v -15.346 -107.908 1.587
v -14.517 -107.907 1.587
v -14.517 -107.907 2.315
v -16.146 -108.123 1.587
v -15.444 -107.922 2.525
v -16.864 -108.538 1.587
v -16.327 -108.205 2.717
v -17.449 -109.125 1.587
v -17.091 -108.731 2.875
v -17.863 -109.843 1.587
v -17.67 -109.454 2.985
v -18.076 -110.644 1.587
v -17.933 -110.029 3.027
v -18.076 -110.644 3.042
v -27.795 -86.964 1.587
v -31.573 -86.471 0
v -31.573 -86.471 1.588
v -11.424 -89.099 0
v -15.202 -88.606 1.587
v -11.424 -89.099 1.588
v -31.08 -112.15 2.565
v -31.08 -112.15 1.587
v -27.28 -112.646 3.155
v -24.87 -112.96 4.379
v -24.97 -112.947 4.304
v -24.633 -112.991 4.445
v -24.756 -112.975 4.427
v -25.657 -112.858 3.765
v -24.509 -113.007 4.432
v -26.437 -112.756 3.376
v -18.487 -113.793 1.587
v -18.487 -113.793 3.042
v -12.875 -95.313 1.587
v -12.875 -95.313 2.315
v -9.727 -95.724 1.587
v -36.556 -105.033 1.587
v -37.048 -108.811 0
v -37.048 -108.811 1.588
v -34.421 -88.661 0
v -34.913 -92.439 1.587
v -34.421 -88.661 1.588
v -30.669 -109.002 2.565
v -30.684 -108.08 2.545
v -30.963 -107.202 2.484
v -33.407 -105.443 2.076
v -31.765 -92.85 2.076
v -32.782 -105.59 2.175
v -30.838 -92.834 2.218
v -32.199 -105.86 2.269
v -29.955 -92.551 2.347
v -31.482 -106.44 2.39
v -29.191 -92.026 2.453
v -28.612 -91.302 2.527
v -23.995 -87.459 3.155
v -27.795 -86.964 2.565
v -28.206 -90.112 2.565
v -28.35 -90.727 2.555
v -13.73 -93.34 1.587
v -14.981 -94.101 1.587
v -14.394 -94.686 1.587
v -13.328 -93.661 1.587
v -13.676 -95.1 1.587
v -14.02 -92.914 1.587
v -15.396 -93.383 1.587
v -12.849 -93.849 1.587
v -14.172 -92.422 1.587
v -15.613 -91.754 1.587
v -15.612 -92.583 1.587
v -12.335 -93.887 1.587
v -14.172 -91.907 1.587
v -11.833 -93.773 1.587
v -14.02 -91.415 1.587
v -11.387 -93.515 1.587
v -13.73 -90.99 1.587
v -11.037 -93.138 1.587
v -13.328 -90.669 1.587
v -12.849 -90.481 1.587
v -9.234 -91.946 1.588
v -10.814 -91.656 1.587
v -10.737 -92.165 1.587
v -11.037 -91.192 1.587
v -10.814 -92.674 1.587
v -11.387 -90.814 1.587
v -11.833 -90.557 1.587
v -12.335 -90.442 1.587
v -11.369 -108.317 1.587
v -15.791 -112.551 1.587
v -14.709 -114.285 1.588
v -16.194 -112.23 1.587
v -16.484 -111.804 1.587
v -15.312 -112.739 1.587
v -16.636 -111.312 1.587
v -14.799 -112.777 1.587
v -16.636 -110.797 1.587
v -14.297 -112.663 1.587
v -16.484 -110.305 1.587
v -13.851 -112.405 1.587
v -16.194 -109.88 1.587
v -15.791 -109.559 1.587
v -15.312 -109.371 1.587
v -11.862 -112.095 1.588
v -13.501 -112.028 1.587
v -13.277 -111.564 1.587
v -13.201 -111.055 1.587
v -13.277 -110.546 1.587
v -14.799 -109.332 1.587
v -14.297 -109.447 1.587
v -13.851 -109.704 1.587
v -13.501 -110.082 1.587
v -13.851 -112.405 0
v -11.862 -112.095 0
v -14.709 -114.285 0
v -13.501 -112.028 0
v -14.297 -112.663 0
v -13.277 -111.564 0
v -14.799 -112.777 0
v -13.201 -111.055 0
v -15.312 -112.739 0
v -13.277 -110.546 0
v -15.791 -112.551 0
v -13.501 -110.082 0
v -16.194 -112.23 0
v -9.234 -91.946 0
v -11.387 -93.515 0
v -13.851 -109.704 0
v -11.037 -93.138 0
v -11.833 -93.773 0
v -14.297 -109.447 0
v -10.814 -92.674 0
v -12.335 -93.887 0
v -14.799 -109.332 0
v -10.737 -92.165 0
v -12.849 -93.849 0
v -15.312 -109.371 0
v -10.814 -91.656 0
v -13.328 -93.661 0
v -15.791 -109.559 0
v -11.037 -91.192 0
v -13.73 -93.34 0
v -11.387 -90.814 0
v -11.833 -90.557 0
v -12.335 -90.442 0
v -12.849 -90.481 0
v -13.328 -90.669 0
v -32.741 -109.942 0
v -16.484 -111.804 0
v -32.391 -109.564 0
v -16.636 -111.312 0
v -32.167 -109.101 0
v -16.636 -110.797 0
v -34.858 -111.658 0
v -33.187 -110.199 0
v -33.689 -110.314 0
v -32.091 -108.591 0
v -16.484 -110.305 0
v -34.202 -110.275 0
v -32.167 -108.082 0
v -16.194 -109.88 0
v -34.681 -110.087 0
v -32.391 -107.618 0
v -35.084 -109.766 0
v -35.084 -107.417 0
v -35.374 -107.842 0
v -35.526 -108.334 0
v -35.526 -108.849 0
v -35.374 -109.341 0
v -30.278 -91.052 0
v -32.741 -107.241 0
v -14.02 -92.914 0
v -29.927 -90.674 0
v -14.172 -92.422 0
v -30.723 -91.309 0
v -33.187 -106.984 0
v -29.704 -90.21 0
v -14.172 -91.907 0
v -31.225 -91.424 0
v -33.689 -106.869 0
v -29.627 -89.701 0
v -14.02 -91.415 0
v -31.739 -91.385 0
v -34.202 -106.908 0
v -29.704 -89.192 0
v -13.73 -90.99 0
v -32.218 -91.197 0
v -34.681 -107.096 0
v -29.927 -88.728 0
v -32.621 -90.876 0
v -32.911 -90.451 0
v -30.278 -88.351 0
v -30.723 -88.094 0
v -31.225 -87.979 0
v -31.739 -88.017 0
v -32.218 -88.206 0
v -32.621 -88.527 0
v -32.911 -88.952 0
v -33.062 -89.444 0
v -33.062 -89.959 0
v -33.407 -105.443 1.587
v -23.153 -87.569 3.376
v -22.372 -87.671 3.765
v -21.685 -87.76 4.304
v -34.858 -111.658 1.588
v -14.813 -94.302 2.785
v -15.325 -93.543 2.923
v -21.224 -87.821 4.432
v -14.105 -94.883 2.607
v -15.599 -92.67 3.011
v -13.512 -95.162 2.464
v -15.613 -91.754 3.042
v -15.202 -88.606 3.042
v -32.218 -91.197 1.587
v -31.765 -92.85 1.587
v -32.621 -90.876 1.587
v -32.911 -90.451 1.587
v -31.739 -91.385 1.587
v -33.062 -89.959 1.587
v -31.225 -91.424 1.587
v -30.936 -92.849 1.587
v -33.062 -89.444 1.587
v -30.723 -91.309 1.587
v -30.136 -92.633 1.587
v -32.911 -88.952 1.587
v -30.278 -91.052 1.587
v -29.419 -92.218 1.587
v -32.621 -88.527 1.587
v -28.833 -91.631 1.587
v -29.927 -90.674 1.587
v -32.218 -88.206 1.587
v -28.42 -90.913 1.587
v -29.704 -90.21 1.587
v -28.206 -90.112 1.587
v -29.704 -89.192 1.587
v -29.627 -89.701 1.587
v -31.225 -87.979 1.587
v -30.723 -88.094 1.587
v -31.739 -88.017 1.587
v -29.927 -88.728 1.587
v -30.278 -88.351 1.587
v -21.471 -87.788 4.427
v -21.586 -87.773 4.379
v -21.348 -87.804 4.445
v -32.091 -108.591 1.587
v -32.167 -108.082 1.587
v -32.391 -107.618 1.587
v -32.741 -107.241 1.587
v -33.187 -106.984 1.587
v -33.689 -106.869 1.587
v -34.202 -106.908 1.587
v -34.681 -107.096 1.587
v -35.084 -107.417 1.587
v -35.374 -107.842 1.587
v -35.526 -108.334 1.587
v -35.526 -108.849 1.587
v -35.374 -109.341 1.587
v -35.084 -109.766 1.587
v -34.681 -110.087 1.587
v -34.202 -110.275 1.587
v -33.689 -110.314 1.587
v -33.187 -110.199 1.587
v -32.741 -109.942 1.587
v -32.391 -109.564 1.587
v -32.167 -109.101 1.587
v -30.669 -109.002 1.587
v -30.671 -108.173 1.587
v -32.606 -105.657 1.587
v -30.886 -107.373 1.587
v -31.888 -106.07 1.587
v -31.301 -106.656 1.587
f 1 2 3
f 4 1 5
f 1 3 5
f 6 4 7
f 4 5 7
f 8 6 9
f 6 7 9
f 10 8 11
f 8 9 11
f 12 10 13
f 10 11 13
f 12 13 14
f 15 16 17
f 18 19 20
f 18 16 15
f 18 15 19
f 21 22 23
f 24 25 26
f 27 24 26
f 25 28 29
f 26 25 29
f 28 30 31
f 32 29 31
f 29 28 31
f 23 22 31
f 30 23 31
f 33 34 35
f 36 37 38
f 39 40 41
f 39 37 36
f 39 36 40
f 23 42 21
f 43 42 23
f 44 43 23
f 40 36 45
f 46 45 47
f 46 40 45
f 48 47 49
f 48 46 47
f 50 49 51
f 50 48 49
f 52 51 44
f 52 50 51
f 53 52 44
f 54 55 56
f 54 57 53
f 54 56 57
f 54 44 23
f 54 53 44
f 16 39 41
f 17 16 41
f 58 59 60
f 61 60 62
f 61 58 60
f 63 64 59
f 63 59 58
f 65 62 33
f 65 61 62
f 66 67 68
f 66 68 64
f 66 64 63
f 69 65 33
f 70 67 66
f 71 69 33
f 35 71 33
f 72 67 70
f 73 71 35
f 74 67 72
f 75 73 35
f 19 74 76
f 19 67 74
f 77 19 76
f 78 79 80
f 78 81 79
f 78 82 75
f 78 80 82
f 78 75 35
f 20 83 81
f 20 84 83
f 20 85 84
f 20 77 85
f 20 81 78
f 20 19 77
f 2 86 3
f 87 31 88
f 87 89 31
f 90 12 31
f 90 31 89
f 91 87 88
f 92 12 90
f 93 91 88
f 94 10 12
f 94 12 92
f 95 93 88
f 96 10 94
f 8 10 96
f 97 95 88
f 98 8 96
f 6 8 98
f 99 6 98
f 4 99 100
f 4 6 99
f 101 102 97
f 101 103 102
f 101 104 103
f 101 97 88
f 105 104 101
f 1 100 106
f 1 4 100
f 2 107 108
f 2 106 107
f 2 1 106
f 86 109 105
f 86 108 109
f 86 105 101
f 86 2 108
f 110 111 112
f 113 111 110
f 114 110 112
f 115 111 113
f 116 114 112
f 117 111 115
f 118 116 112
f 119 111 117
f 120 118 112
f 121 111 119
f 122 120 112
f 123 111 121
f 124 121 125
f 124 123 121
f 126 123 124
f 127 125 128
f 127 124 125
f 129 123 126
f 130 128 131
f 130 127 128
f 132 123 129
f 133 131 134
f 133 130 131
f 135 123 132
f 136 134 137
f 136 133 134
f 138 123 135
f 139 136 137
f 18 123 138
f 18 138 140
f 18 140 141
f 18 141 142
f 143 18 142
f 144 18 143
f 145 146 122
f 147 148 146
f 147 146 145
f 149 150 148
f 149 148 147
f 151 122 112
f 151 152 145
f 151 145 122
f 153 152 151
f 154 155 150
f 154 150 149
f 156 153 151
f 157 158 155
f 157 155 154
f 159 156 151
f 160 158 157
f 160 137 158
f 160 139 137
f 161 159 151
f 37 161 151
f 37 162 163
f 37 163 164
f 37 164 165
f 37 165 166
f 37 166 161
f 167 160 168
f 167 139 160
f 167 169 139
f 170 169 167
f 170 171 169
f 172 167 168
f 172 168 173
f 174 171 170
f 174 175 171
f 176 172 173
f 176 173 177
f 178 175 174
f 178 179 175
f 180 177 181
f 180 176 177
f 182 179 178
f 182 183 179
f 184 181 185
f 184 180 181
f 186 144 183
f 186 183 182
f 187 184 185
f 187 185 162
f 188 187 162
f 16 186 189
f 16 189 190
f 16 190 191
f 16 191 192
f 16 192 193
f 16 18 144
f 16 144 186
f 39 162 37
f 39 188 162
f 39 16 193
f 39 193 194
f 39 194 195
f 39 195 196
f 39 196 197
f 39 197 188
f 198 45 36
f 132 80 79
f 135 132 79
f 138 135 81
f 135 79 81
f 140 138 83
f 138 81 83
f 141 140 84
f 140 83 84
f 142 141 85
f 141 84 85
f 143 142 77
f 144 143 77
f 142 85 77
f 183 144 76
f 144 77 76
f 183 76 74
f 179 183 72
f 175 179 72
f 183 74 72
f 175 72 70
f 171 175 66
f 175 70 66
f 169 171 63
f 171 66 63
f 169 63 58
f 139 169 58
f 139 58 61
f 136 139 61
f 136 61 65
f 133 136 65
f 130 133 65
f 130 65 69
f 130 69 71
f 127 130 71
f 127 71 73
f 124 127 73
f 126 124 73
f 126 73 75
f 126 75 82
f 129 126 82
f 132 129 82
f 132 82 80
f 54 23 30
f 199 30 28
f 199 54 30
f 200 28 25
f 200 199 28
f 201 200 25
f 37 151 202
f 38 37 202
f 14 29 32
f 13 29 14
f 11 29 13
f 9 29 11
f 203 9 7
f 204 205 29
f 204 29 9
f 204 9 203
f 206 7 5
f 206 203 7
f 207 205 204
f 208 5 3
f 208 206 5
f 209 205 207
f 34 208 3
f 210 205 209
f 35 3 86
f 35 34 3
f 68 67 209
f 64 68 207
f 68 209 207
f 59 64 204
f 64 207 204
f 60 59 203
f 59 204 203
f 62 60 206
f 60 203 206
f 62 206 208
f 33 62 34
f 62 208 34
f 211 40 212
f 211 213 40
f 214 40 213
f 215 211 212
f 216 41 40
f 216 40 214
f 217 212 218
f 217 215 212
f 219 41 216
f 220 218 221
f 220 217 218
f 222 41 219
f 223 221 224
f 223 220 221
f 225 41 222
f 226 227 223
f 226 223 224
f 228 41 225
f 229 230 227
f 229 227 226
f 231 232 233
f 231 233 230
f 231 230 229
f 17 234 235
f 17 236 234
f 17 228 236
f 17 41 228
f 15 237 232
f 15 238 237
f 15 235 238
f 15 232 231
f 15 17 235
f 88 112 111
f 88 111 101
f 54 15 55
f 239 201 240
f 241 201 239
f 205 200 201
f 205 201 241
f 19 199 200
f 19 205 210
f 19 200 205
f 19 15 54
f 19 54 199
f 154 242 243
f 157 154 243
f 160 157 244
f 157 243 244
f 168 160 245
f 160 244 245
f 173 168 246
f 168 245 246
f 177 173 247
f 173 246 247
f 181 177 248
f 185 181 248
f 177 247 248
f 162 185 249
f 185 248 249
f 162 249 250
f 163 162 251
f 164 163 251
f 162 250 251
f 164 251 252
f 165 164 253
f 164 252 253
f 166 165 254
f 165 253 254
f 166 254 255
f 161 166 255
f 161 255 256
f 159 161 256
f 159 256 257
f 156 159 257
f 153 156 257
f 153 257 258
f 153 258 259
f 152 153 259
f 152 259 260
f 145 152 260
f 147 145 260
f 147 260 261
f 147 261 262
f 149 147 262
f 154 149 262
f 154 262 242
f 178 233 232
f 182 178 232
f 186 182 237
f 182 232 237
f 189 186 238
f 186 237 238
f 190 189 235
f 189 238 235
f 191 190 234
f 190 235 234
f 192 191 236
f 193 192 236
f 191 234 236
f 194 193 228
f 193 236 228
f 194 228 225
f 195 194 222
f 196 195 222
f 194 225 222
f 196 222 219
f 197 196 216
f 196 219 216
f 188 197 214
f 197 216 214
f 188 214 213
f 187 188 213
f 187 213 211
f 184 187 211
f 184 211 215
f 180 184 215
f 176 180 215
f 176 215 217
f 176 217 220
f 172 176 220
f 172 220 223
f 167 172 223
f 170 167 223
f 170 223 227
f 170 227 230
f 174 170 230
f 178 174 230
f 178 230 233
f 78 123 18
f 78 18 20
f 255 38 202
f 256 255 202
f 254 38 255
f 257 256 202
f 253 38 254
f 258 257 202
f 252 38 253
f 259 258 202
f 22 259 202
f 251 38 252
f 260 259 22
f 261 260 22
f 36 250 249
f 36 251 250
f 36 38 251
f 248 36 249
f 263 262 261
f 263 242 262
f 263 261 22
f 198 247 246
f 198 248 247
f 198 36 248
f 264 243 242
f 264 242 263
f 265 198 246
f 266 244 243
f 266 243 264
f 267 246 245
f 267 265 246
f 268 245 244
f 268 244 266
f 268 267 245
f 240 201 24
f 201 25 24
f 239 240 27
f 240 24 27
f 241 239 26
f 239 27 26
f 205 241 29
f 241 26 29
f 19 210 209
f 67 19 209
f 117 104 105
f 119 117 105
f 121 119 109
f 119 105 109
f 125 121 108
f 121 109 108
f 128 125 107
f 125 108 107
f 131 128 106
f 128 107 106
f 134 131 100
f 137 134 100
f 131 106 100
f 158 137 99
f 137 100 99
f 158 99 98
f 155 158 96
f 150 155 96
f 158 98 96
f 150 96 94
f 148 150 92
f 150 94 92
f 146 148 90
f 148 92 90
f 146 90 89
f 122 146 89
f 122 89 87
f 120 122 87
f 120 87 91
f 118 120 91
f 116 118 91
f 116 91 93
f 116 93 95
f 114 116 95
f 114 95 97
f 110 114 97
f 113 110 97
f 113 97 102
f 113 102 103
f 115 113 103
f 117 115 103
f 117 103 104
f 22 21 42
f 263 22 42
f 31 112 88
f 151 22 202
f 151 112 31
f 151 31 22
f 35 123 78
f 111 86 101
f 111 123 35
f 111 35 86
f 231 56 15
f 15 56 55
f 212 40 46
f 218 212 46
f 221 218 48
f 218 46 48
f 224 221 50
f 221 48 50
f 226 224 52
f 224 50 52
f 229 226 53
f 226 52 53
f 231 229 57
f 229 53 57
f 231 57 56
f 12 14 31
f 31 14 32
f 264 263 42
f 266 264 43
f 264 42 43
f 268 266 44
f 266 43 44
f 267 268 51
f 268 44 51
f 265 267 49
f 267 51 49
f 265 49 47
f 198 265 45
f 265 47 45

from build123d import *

# Parameters (mm, degrees)
BOSS_EXTRUDE1_DEPTH   = 1.5875
BOSS_EXTRUDE3_DEPTH   = 25.4
FILLET2_R             = 0.508
F_4_CLEARANCE_HOLE1_D = 3.4544
CUT_EXTRUDE3_START    = -6.35
CUT_EXTRUDE3_DEPTH    = 4.7625
CHAMFER1_SIZE         = 2.54


with BuildPart() as part:
    # Sketch2 → Boss-Extrude1 (new body)
    with BuildSketch(Plane.XY):
        Polygon((-37.376757149, -111.329189904), (-34.092160805, -86.142458737), (-8.905429638, -89.427055082), (-12.190025983, -114.613786248), align=None)
    extrude(amount=BOSS_EXTRUDE1_DEPTH)

    # Sketch4 → Boss-Extrude3 (add)
    with BuildSketch(Plane(origin=(-11.61606456, -89.073561748, 0), x_dir=(0.9916035892333672, -0.12931481670521638, 0), z_dir=(0.12931481670521638, 0.9916035892333672, 0))):
        with BuildLine():
            Line((-22.666412757, -1.5875), (-12.484171192, -3.155171915))
            ThreePointArc((-12.484171192, -3.155171915), (-11.111427592, -3.611643646), (-9.966412757, -4.4958))
            Line((-9.966412757, -4.4958), (2.733587243, -1.5875))
            Line((2.733587243, -1.5875), (-22.666412757, -1.5875))
        make_face()
    extrude(amount=-BOSS_EXTRUDE3_DEPTH)

    # Fillet2
    fillet2_edges = [part.edges().sort_by_distance(p)[0] for p in [
        (-23.141093394, -100.378122493, 4.4958),
    ]]
    fillet(fillet2_edges, radius=FILLET2_R)

    # #4 Clearance Hole1 (through all)
    with Locations(Plane(origin=(0, 0, 0), x_dir=(-1, 0, 0), z_dir=(0, 0, -1))):
        with Locations((12.464345577, -92.164821934), (31.354393952, -89.701374676), (33.81784121, -108.591423051), (14.927792835, -111.054870309)):
            Hole(F_4_CLEARANCE_HOLE1_D / 2)

    # Sketch9 → Cut-Extrude3 (cut)
    with BuildSketch(Plane(origin=(0, 0, 0), x_dir=(-1, 0, 0), z_dir=(0, 0, -1)).offset(CUT_EXTRUDE3_START)):
        with BuildLine():
            Line((33.407266667, -105.443081655), (39.974131611, -104.586698171))
            Line((39.974131611, -104.586698171), (39.974131611, -116.083768321))
            Line((39.974131611, -116.083768321), (31.712540611, -117.000176181))
            Line((31.712540611, -117.000176181), (30.669499814, -109.001997594))
            ThreePointArc((30.669499814, -109.001997594), (31.301307616, -106.655529544), (33.407266667, -105.443081655))
        make_face()
        with BuildLine():
            Line((27.163011759, -82.113770632), (35.383316986, -80.880777852))
            Line((35.383316986, -80.880777852), (38.331833439, -91.993332588))
            Line((38.331833439, -91.993332588), (31.764968495, -92.849716072))
            ThreePointArc((31.764968495, -92.849716072), (29.418500445, -92.21790827), (28.206052556, -90.111949219))
            Line((28.206052556, -90.111949219), (27.163011759, -82.113770632))
        make_face()
        with BuildLine():
            Line((12.87492012, -95.31316333), (6.308055176, -96.169546814))
            Line((6.308055176, -96.169546814), (6.308055176, -84.672476664))
            Line((6.308055176, -84.672476664), (14.569646176, -83.756068805))
            Line((14.569646176, -83.756068805), (15.612686973, -91.754247391))
            ThreePointArc((15.612686973, -91.754247391), (14.980879171, -94.100715441), (12.87492012, -95.31316333))
        make_face()
        with BuildLine():
            Line((19.119175028, -118.642474353), (10.898869802, -119.875467134))
            Line((10.898869802, -119.875467134), (7.950353349, -108.762912398))
            Line((7.950353349, -108.762912398), (14.517218292, -107.906528913))
            ThreePointArc((14.517218292, -107.906528913), (16.863686342, -108.538336715), (18.076134231, -110.644295766))
            Line((18.076134231, -110.644295766), (19.119175028, -118.642474353))
        make_face()
    extrude(amount=CUT_EXTRUDE3_DEPTH, mode=Mode.SUBTRACT)

    # Chamfer1
    chamfer1_edges = [part.edges().sort_by_distance(p)[0] for p in [
        (-37.376757149, -111.329189904, 0.79375),
        (-34.092160805, -86.142458737, 0.79375),
        (-8.905429638, -89.427055082, 0.79375),
        (-12.190025983, -114.613786248, 0.79375),
    ]]
    chamfer(chamfer1_edges, length=CHAMFER1_SIZE)


solid = part.part
